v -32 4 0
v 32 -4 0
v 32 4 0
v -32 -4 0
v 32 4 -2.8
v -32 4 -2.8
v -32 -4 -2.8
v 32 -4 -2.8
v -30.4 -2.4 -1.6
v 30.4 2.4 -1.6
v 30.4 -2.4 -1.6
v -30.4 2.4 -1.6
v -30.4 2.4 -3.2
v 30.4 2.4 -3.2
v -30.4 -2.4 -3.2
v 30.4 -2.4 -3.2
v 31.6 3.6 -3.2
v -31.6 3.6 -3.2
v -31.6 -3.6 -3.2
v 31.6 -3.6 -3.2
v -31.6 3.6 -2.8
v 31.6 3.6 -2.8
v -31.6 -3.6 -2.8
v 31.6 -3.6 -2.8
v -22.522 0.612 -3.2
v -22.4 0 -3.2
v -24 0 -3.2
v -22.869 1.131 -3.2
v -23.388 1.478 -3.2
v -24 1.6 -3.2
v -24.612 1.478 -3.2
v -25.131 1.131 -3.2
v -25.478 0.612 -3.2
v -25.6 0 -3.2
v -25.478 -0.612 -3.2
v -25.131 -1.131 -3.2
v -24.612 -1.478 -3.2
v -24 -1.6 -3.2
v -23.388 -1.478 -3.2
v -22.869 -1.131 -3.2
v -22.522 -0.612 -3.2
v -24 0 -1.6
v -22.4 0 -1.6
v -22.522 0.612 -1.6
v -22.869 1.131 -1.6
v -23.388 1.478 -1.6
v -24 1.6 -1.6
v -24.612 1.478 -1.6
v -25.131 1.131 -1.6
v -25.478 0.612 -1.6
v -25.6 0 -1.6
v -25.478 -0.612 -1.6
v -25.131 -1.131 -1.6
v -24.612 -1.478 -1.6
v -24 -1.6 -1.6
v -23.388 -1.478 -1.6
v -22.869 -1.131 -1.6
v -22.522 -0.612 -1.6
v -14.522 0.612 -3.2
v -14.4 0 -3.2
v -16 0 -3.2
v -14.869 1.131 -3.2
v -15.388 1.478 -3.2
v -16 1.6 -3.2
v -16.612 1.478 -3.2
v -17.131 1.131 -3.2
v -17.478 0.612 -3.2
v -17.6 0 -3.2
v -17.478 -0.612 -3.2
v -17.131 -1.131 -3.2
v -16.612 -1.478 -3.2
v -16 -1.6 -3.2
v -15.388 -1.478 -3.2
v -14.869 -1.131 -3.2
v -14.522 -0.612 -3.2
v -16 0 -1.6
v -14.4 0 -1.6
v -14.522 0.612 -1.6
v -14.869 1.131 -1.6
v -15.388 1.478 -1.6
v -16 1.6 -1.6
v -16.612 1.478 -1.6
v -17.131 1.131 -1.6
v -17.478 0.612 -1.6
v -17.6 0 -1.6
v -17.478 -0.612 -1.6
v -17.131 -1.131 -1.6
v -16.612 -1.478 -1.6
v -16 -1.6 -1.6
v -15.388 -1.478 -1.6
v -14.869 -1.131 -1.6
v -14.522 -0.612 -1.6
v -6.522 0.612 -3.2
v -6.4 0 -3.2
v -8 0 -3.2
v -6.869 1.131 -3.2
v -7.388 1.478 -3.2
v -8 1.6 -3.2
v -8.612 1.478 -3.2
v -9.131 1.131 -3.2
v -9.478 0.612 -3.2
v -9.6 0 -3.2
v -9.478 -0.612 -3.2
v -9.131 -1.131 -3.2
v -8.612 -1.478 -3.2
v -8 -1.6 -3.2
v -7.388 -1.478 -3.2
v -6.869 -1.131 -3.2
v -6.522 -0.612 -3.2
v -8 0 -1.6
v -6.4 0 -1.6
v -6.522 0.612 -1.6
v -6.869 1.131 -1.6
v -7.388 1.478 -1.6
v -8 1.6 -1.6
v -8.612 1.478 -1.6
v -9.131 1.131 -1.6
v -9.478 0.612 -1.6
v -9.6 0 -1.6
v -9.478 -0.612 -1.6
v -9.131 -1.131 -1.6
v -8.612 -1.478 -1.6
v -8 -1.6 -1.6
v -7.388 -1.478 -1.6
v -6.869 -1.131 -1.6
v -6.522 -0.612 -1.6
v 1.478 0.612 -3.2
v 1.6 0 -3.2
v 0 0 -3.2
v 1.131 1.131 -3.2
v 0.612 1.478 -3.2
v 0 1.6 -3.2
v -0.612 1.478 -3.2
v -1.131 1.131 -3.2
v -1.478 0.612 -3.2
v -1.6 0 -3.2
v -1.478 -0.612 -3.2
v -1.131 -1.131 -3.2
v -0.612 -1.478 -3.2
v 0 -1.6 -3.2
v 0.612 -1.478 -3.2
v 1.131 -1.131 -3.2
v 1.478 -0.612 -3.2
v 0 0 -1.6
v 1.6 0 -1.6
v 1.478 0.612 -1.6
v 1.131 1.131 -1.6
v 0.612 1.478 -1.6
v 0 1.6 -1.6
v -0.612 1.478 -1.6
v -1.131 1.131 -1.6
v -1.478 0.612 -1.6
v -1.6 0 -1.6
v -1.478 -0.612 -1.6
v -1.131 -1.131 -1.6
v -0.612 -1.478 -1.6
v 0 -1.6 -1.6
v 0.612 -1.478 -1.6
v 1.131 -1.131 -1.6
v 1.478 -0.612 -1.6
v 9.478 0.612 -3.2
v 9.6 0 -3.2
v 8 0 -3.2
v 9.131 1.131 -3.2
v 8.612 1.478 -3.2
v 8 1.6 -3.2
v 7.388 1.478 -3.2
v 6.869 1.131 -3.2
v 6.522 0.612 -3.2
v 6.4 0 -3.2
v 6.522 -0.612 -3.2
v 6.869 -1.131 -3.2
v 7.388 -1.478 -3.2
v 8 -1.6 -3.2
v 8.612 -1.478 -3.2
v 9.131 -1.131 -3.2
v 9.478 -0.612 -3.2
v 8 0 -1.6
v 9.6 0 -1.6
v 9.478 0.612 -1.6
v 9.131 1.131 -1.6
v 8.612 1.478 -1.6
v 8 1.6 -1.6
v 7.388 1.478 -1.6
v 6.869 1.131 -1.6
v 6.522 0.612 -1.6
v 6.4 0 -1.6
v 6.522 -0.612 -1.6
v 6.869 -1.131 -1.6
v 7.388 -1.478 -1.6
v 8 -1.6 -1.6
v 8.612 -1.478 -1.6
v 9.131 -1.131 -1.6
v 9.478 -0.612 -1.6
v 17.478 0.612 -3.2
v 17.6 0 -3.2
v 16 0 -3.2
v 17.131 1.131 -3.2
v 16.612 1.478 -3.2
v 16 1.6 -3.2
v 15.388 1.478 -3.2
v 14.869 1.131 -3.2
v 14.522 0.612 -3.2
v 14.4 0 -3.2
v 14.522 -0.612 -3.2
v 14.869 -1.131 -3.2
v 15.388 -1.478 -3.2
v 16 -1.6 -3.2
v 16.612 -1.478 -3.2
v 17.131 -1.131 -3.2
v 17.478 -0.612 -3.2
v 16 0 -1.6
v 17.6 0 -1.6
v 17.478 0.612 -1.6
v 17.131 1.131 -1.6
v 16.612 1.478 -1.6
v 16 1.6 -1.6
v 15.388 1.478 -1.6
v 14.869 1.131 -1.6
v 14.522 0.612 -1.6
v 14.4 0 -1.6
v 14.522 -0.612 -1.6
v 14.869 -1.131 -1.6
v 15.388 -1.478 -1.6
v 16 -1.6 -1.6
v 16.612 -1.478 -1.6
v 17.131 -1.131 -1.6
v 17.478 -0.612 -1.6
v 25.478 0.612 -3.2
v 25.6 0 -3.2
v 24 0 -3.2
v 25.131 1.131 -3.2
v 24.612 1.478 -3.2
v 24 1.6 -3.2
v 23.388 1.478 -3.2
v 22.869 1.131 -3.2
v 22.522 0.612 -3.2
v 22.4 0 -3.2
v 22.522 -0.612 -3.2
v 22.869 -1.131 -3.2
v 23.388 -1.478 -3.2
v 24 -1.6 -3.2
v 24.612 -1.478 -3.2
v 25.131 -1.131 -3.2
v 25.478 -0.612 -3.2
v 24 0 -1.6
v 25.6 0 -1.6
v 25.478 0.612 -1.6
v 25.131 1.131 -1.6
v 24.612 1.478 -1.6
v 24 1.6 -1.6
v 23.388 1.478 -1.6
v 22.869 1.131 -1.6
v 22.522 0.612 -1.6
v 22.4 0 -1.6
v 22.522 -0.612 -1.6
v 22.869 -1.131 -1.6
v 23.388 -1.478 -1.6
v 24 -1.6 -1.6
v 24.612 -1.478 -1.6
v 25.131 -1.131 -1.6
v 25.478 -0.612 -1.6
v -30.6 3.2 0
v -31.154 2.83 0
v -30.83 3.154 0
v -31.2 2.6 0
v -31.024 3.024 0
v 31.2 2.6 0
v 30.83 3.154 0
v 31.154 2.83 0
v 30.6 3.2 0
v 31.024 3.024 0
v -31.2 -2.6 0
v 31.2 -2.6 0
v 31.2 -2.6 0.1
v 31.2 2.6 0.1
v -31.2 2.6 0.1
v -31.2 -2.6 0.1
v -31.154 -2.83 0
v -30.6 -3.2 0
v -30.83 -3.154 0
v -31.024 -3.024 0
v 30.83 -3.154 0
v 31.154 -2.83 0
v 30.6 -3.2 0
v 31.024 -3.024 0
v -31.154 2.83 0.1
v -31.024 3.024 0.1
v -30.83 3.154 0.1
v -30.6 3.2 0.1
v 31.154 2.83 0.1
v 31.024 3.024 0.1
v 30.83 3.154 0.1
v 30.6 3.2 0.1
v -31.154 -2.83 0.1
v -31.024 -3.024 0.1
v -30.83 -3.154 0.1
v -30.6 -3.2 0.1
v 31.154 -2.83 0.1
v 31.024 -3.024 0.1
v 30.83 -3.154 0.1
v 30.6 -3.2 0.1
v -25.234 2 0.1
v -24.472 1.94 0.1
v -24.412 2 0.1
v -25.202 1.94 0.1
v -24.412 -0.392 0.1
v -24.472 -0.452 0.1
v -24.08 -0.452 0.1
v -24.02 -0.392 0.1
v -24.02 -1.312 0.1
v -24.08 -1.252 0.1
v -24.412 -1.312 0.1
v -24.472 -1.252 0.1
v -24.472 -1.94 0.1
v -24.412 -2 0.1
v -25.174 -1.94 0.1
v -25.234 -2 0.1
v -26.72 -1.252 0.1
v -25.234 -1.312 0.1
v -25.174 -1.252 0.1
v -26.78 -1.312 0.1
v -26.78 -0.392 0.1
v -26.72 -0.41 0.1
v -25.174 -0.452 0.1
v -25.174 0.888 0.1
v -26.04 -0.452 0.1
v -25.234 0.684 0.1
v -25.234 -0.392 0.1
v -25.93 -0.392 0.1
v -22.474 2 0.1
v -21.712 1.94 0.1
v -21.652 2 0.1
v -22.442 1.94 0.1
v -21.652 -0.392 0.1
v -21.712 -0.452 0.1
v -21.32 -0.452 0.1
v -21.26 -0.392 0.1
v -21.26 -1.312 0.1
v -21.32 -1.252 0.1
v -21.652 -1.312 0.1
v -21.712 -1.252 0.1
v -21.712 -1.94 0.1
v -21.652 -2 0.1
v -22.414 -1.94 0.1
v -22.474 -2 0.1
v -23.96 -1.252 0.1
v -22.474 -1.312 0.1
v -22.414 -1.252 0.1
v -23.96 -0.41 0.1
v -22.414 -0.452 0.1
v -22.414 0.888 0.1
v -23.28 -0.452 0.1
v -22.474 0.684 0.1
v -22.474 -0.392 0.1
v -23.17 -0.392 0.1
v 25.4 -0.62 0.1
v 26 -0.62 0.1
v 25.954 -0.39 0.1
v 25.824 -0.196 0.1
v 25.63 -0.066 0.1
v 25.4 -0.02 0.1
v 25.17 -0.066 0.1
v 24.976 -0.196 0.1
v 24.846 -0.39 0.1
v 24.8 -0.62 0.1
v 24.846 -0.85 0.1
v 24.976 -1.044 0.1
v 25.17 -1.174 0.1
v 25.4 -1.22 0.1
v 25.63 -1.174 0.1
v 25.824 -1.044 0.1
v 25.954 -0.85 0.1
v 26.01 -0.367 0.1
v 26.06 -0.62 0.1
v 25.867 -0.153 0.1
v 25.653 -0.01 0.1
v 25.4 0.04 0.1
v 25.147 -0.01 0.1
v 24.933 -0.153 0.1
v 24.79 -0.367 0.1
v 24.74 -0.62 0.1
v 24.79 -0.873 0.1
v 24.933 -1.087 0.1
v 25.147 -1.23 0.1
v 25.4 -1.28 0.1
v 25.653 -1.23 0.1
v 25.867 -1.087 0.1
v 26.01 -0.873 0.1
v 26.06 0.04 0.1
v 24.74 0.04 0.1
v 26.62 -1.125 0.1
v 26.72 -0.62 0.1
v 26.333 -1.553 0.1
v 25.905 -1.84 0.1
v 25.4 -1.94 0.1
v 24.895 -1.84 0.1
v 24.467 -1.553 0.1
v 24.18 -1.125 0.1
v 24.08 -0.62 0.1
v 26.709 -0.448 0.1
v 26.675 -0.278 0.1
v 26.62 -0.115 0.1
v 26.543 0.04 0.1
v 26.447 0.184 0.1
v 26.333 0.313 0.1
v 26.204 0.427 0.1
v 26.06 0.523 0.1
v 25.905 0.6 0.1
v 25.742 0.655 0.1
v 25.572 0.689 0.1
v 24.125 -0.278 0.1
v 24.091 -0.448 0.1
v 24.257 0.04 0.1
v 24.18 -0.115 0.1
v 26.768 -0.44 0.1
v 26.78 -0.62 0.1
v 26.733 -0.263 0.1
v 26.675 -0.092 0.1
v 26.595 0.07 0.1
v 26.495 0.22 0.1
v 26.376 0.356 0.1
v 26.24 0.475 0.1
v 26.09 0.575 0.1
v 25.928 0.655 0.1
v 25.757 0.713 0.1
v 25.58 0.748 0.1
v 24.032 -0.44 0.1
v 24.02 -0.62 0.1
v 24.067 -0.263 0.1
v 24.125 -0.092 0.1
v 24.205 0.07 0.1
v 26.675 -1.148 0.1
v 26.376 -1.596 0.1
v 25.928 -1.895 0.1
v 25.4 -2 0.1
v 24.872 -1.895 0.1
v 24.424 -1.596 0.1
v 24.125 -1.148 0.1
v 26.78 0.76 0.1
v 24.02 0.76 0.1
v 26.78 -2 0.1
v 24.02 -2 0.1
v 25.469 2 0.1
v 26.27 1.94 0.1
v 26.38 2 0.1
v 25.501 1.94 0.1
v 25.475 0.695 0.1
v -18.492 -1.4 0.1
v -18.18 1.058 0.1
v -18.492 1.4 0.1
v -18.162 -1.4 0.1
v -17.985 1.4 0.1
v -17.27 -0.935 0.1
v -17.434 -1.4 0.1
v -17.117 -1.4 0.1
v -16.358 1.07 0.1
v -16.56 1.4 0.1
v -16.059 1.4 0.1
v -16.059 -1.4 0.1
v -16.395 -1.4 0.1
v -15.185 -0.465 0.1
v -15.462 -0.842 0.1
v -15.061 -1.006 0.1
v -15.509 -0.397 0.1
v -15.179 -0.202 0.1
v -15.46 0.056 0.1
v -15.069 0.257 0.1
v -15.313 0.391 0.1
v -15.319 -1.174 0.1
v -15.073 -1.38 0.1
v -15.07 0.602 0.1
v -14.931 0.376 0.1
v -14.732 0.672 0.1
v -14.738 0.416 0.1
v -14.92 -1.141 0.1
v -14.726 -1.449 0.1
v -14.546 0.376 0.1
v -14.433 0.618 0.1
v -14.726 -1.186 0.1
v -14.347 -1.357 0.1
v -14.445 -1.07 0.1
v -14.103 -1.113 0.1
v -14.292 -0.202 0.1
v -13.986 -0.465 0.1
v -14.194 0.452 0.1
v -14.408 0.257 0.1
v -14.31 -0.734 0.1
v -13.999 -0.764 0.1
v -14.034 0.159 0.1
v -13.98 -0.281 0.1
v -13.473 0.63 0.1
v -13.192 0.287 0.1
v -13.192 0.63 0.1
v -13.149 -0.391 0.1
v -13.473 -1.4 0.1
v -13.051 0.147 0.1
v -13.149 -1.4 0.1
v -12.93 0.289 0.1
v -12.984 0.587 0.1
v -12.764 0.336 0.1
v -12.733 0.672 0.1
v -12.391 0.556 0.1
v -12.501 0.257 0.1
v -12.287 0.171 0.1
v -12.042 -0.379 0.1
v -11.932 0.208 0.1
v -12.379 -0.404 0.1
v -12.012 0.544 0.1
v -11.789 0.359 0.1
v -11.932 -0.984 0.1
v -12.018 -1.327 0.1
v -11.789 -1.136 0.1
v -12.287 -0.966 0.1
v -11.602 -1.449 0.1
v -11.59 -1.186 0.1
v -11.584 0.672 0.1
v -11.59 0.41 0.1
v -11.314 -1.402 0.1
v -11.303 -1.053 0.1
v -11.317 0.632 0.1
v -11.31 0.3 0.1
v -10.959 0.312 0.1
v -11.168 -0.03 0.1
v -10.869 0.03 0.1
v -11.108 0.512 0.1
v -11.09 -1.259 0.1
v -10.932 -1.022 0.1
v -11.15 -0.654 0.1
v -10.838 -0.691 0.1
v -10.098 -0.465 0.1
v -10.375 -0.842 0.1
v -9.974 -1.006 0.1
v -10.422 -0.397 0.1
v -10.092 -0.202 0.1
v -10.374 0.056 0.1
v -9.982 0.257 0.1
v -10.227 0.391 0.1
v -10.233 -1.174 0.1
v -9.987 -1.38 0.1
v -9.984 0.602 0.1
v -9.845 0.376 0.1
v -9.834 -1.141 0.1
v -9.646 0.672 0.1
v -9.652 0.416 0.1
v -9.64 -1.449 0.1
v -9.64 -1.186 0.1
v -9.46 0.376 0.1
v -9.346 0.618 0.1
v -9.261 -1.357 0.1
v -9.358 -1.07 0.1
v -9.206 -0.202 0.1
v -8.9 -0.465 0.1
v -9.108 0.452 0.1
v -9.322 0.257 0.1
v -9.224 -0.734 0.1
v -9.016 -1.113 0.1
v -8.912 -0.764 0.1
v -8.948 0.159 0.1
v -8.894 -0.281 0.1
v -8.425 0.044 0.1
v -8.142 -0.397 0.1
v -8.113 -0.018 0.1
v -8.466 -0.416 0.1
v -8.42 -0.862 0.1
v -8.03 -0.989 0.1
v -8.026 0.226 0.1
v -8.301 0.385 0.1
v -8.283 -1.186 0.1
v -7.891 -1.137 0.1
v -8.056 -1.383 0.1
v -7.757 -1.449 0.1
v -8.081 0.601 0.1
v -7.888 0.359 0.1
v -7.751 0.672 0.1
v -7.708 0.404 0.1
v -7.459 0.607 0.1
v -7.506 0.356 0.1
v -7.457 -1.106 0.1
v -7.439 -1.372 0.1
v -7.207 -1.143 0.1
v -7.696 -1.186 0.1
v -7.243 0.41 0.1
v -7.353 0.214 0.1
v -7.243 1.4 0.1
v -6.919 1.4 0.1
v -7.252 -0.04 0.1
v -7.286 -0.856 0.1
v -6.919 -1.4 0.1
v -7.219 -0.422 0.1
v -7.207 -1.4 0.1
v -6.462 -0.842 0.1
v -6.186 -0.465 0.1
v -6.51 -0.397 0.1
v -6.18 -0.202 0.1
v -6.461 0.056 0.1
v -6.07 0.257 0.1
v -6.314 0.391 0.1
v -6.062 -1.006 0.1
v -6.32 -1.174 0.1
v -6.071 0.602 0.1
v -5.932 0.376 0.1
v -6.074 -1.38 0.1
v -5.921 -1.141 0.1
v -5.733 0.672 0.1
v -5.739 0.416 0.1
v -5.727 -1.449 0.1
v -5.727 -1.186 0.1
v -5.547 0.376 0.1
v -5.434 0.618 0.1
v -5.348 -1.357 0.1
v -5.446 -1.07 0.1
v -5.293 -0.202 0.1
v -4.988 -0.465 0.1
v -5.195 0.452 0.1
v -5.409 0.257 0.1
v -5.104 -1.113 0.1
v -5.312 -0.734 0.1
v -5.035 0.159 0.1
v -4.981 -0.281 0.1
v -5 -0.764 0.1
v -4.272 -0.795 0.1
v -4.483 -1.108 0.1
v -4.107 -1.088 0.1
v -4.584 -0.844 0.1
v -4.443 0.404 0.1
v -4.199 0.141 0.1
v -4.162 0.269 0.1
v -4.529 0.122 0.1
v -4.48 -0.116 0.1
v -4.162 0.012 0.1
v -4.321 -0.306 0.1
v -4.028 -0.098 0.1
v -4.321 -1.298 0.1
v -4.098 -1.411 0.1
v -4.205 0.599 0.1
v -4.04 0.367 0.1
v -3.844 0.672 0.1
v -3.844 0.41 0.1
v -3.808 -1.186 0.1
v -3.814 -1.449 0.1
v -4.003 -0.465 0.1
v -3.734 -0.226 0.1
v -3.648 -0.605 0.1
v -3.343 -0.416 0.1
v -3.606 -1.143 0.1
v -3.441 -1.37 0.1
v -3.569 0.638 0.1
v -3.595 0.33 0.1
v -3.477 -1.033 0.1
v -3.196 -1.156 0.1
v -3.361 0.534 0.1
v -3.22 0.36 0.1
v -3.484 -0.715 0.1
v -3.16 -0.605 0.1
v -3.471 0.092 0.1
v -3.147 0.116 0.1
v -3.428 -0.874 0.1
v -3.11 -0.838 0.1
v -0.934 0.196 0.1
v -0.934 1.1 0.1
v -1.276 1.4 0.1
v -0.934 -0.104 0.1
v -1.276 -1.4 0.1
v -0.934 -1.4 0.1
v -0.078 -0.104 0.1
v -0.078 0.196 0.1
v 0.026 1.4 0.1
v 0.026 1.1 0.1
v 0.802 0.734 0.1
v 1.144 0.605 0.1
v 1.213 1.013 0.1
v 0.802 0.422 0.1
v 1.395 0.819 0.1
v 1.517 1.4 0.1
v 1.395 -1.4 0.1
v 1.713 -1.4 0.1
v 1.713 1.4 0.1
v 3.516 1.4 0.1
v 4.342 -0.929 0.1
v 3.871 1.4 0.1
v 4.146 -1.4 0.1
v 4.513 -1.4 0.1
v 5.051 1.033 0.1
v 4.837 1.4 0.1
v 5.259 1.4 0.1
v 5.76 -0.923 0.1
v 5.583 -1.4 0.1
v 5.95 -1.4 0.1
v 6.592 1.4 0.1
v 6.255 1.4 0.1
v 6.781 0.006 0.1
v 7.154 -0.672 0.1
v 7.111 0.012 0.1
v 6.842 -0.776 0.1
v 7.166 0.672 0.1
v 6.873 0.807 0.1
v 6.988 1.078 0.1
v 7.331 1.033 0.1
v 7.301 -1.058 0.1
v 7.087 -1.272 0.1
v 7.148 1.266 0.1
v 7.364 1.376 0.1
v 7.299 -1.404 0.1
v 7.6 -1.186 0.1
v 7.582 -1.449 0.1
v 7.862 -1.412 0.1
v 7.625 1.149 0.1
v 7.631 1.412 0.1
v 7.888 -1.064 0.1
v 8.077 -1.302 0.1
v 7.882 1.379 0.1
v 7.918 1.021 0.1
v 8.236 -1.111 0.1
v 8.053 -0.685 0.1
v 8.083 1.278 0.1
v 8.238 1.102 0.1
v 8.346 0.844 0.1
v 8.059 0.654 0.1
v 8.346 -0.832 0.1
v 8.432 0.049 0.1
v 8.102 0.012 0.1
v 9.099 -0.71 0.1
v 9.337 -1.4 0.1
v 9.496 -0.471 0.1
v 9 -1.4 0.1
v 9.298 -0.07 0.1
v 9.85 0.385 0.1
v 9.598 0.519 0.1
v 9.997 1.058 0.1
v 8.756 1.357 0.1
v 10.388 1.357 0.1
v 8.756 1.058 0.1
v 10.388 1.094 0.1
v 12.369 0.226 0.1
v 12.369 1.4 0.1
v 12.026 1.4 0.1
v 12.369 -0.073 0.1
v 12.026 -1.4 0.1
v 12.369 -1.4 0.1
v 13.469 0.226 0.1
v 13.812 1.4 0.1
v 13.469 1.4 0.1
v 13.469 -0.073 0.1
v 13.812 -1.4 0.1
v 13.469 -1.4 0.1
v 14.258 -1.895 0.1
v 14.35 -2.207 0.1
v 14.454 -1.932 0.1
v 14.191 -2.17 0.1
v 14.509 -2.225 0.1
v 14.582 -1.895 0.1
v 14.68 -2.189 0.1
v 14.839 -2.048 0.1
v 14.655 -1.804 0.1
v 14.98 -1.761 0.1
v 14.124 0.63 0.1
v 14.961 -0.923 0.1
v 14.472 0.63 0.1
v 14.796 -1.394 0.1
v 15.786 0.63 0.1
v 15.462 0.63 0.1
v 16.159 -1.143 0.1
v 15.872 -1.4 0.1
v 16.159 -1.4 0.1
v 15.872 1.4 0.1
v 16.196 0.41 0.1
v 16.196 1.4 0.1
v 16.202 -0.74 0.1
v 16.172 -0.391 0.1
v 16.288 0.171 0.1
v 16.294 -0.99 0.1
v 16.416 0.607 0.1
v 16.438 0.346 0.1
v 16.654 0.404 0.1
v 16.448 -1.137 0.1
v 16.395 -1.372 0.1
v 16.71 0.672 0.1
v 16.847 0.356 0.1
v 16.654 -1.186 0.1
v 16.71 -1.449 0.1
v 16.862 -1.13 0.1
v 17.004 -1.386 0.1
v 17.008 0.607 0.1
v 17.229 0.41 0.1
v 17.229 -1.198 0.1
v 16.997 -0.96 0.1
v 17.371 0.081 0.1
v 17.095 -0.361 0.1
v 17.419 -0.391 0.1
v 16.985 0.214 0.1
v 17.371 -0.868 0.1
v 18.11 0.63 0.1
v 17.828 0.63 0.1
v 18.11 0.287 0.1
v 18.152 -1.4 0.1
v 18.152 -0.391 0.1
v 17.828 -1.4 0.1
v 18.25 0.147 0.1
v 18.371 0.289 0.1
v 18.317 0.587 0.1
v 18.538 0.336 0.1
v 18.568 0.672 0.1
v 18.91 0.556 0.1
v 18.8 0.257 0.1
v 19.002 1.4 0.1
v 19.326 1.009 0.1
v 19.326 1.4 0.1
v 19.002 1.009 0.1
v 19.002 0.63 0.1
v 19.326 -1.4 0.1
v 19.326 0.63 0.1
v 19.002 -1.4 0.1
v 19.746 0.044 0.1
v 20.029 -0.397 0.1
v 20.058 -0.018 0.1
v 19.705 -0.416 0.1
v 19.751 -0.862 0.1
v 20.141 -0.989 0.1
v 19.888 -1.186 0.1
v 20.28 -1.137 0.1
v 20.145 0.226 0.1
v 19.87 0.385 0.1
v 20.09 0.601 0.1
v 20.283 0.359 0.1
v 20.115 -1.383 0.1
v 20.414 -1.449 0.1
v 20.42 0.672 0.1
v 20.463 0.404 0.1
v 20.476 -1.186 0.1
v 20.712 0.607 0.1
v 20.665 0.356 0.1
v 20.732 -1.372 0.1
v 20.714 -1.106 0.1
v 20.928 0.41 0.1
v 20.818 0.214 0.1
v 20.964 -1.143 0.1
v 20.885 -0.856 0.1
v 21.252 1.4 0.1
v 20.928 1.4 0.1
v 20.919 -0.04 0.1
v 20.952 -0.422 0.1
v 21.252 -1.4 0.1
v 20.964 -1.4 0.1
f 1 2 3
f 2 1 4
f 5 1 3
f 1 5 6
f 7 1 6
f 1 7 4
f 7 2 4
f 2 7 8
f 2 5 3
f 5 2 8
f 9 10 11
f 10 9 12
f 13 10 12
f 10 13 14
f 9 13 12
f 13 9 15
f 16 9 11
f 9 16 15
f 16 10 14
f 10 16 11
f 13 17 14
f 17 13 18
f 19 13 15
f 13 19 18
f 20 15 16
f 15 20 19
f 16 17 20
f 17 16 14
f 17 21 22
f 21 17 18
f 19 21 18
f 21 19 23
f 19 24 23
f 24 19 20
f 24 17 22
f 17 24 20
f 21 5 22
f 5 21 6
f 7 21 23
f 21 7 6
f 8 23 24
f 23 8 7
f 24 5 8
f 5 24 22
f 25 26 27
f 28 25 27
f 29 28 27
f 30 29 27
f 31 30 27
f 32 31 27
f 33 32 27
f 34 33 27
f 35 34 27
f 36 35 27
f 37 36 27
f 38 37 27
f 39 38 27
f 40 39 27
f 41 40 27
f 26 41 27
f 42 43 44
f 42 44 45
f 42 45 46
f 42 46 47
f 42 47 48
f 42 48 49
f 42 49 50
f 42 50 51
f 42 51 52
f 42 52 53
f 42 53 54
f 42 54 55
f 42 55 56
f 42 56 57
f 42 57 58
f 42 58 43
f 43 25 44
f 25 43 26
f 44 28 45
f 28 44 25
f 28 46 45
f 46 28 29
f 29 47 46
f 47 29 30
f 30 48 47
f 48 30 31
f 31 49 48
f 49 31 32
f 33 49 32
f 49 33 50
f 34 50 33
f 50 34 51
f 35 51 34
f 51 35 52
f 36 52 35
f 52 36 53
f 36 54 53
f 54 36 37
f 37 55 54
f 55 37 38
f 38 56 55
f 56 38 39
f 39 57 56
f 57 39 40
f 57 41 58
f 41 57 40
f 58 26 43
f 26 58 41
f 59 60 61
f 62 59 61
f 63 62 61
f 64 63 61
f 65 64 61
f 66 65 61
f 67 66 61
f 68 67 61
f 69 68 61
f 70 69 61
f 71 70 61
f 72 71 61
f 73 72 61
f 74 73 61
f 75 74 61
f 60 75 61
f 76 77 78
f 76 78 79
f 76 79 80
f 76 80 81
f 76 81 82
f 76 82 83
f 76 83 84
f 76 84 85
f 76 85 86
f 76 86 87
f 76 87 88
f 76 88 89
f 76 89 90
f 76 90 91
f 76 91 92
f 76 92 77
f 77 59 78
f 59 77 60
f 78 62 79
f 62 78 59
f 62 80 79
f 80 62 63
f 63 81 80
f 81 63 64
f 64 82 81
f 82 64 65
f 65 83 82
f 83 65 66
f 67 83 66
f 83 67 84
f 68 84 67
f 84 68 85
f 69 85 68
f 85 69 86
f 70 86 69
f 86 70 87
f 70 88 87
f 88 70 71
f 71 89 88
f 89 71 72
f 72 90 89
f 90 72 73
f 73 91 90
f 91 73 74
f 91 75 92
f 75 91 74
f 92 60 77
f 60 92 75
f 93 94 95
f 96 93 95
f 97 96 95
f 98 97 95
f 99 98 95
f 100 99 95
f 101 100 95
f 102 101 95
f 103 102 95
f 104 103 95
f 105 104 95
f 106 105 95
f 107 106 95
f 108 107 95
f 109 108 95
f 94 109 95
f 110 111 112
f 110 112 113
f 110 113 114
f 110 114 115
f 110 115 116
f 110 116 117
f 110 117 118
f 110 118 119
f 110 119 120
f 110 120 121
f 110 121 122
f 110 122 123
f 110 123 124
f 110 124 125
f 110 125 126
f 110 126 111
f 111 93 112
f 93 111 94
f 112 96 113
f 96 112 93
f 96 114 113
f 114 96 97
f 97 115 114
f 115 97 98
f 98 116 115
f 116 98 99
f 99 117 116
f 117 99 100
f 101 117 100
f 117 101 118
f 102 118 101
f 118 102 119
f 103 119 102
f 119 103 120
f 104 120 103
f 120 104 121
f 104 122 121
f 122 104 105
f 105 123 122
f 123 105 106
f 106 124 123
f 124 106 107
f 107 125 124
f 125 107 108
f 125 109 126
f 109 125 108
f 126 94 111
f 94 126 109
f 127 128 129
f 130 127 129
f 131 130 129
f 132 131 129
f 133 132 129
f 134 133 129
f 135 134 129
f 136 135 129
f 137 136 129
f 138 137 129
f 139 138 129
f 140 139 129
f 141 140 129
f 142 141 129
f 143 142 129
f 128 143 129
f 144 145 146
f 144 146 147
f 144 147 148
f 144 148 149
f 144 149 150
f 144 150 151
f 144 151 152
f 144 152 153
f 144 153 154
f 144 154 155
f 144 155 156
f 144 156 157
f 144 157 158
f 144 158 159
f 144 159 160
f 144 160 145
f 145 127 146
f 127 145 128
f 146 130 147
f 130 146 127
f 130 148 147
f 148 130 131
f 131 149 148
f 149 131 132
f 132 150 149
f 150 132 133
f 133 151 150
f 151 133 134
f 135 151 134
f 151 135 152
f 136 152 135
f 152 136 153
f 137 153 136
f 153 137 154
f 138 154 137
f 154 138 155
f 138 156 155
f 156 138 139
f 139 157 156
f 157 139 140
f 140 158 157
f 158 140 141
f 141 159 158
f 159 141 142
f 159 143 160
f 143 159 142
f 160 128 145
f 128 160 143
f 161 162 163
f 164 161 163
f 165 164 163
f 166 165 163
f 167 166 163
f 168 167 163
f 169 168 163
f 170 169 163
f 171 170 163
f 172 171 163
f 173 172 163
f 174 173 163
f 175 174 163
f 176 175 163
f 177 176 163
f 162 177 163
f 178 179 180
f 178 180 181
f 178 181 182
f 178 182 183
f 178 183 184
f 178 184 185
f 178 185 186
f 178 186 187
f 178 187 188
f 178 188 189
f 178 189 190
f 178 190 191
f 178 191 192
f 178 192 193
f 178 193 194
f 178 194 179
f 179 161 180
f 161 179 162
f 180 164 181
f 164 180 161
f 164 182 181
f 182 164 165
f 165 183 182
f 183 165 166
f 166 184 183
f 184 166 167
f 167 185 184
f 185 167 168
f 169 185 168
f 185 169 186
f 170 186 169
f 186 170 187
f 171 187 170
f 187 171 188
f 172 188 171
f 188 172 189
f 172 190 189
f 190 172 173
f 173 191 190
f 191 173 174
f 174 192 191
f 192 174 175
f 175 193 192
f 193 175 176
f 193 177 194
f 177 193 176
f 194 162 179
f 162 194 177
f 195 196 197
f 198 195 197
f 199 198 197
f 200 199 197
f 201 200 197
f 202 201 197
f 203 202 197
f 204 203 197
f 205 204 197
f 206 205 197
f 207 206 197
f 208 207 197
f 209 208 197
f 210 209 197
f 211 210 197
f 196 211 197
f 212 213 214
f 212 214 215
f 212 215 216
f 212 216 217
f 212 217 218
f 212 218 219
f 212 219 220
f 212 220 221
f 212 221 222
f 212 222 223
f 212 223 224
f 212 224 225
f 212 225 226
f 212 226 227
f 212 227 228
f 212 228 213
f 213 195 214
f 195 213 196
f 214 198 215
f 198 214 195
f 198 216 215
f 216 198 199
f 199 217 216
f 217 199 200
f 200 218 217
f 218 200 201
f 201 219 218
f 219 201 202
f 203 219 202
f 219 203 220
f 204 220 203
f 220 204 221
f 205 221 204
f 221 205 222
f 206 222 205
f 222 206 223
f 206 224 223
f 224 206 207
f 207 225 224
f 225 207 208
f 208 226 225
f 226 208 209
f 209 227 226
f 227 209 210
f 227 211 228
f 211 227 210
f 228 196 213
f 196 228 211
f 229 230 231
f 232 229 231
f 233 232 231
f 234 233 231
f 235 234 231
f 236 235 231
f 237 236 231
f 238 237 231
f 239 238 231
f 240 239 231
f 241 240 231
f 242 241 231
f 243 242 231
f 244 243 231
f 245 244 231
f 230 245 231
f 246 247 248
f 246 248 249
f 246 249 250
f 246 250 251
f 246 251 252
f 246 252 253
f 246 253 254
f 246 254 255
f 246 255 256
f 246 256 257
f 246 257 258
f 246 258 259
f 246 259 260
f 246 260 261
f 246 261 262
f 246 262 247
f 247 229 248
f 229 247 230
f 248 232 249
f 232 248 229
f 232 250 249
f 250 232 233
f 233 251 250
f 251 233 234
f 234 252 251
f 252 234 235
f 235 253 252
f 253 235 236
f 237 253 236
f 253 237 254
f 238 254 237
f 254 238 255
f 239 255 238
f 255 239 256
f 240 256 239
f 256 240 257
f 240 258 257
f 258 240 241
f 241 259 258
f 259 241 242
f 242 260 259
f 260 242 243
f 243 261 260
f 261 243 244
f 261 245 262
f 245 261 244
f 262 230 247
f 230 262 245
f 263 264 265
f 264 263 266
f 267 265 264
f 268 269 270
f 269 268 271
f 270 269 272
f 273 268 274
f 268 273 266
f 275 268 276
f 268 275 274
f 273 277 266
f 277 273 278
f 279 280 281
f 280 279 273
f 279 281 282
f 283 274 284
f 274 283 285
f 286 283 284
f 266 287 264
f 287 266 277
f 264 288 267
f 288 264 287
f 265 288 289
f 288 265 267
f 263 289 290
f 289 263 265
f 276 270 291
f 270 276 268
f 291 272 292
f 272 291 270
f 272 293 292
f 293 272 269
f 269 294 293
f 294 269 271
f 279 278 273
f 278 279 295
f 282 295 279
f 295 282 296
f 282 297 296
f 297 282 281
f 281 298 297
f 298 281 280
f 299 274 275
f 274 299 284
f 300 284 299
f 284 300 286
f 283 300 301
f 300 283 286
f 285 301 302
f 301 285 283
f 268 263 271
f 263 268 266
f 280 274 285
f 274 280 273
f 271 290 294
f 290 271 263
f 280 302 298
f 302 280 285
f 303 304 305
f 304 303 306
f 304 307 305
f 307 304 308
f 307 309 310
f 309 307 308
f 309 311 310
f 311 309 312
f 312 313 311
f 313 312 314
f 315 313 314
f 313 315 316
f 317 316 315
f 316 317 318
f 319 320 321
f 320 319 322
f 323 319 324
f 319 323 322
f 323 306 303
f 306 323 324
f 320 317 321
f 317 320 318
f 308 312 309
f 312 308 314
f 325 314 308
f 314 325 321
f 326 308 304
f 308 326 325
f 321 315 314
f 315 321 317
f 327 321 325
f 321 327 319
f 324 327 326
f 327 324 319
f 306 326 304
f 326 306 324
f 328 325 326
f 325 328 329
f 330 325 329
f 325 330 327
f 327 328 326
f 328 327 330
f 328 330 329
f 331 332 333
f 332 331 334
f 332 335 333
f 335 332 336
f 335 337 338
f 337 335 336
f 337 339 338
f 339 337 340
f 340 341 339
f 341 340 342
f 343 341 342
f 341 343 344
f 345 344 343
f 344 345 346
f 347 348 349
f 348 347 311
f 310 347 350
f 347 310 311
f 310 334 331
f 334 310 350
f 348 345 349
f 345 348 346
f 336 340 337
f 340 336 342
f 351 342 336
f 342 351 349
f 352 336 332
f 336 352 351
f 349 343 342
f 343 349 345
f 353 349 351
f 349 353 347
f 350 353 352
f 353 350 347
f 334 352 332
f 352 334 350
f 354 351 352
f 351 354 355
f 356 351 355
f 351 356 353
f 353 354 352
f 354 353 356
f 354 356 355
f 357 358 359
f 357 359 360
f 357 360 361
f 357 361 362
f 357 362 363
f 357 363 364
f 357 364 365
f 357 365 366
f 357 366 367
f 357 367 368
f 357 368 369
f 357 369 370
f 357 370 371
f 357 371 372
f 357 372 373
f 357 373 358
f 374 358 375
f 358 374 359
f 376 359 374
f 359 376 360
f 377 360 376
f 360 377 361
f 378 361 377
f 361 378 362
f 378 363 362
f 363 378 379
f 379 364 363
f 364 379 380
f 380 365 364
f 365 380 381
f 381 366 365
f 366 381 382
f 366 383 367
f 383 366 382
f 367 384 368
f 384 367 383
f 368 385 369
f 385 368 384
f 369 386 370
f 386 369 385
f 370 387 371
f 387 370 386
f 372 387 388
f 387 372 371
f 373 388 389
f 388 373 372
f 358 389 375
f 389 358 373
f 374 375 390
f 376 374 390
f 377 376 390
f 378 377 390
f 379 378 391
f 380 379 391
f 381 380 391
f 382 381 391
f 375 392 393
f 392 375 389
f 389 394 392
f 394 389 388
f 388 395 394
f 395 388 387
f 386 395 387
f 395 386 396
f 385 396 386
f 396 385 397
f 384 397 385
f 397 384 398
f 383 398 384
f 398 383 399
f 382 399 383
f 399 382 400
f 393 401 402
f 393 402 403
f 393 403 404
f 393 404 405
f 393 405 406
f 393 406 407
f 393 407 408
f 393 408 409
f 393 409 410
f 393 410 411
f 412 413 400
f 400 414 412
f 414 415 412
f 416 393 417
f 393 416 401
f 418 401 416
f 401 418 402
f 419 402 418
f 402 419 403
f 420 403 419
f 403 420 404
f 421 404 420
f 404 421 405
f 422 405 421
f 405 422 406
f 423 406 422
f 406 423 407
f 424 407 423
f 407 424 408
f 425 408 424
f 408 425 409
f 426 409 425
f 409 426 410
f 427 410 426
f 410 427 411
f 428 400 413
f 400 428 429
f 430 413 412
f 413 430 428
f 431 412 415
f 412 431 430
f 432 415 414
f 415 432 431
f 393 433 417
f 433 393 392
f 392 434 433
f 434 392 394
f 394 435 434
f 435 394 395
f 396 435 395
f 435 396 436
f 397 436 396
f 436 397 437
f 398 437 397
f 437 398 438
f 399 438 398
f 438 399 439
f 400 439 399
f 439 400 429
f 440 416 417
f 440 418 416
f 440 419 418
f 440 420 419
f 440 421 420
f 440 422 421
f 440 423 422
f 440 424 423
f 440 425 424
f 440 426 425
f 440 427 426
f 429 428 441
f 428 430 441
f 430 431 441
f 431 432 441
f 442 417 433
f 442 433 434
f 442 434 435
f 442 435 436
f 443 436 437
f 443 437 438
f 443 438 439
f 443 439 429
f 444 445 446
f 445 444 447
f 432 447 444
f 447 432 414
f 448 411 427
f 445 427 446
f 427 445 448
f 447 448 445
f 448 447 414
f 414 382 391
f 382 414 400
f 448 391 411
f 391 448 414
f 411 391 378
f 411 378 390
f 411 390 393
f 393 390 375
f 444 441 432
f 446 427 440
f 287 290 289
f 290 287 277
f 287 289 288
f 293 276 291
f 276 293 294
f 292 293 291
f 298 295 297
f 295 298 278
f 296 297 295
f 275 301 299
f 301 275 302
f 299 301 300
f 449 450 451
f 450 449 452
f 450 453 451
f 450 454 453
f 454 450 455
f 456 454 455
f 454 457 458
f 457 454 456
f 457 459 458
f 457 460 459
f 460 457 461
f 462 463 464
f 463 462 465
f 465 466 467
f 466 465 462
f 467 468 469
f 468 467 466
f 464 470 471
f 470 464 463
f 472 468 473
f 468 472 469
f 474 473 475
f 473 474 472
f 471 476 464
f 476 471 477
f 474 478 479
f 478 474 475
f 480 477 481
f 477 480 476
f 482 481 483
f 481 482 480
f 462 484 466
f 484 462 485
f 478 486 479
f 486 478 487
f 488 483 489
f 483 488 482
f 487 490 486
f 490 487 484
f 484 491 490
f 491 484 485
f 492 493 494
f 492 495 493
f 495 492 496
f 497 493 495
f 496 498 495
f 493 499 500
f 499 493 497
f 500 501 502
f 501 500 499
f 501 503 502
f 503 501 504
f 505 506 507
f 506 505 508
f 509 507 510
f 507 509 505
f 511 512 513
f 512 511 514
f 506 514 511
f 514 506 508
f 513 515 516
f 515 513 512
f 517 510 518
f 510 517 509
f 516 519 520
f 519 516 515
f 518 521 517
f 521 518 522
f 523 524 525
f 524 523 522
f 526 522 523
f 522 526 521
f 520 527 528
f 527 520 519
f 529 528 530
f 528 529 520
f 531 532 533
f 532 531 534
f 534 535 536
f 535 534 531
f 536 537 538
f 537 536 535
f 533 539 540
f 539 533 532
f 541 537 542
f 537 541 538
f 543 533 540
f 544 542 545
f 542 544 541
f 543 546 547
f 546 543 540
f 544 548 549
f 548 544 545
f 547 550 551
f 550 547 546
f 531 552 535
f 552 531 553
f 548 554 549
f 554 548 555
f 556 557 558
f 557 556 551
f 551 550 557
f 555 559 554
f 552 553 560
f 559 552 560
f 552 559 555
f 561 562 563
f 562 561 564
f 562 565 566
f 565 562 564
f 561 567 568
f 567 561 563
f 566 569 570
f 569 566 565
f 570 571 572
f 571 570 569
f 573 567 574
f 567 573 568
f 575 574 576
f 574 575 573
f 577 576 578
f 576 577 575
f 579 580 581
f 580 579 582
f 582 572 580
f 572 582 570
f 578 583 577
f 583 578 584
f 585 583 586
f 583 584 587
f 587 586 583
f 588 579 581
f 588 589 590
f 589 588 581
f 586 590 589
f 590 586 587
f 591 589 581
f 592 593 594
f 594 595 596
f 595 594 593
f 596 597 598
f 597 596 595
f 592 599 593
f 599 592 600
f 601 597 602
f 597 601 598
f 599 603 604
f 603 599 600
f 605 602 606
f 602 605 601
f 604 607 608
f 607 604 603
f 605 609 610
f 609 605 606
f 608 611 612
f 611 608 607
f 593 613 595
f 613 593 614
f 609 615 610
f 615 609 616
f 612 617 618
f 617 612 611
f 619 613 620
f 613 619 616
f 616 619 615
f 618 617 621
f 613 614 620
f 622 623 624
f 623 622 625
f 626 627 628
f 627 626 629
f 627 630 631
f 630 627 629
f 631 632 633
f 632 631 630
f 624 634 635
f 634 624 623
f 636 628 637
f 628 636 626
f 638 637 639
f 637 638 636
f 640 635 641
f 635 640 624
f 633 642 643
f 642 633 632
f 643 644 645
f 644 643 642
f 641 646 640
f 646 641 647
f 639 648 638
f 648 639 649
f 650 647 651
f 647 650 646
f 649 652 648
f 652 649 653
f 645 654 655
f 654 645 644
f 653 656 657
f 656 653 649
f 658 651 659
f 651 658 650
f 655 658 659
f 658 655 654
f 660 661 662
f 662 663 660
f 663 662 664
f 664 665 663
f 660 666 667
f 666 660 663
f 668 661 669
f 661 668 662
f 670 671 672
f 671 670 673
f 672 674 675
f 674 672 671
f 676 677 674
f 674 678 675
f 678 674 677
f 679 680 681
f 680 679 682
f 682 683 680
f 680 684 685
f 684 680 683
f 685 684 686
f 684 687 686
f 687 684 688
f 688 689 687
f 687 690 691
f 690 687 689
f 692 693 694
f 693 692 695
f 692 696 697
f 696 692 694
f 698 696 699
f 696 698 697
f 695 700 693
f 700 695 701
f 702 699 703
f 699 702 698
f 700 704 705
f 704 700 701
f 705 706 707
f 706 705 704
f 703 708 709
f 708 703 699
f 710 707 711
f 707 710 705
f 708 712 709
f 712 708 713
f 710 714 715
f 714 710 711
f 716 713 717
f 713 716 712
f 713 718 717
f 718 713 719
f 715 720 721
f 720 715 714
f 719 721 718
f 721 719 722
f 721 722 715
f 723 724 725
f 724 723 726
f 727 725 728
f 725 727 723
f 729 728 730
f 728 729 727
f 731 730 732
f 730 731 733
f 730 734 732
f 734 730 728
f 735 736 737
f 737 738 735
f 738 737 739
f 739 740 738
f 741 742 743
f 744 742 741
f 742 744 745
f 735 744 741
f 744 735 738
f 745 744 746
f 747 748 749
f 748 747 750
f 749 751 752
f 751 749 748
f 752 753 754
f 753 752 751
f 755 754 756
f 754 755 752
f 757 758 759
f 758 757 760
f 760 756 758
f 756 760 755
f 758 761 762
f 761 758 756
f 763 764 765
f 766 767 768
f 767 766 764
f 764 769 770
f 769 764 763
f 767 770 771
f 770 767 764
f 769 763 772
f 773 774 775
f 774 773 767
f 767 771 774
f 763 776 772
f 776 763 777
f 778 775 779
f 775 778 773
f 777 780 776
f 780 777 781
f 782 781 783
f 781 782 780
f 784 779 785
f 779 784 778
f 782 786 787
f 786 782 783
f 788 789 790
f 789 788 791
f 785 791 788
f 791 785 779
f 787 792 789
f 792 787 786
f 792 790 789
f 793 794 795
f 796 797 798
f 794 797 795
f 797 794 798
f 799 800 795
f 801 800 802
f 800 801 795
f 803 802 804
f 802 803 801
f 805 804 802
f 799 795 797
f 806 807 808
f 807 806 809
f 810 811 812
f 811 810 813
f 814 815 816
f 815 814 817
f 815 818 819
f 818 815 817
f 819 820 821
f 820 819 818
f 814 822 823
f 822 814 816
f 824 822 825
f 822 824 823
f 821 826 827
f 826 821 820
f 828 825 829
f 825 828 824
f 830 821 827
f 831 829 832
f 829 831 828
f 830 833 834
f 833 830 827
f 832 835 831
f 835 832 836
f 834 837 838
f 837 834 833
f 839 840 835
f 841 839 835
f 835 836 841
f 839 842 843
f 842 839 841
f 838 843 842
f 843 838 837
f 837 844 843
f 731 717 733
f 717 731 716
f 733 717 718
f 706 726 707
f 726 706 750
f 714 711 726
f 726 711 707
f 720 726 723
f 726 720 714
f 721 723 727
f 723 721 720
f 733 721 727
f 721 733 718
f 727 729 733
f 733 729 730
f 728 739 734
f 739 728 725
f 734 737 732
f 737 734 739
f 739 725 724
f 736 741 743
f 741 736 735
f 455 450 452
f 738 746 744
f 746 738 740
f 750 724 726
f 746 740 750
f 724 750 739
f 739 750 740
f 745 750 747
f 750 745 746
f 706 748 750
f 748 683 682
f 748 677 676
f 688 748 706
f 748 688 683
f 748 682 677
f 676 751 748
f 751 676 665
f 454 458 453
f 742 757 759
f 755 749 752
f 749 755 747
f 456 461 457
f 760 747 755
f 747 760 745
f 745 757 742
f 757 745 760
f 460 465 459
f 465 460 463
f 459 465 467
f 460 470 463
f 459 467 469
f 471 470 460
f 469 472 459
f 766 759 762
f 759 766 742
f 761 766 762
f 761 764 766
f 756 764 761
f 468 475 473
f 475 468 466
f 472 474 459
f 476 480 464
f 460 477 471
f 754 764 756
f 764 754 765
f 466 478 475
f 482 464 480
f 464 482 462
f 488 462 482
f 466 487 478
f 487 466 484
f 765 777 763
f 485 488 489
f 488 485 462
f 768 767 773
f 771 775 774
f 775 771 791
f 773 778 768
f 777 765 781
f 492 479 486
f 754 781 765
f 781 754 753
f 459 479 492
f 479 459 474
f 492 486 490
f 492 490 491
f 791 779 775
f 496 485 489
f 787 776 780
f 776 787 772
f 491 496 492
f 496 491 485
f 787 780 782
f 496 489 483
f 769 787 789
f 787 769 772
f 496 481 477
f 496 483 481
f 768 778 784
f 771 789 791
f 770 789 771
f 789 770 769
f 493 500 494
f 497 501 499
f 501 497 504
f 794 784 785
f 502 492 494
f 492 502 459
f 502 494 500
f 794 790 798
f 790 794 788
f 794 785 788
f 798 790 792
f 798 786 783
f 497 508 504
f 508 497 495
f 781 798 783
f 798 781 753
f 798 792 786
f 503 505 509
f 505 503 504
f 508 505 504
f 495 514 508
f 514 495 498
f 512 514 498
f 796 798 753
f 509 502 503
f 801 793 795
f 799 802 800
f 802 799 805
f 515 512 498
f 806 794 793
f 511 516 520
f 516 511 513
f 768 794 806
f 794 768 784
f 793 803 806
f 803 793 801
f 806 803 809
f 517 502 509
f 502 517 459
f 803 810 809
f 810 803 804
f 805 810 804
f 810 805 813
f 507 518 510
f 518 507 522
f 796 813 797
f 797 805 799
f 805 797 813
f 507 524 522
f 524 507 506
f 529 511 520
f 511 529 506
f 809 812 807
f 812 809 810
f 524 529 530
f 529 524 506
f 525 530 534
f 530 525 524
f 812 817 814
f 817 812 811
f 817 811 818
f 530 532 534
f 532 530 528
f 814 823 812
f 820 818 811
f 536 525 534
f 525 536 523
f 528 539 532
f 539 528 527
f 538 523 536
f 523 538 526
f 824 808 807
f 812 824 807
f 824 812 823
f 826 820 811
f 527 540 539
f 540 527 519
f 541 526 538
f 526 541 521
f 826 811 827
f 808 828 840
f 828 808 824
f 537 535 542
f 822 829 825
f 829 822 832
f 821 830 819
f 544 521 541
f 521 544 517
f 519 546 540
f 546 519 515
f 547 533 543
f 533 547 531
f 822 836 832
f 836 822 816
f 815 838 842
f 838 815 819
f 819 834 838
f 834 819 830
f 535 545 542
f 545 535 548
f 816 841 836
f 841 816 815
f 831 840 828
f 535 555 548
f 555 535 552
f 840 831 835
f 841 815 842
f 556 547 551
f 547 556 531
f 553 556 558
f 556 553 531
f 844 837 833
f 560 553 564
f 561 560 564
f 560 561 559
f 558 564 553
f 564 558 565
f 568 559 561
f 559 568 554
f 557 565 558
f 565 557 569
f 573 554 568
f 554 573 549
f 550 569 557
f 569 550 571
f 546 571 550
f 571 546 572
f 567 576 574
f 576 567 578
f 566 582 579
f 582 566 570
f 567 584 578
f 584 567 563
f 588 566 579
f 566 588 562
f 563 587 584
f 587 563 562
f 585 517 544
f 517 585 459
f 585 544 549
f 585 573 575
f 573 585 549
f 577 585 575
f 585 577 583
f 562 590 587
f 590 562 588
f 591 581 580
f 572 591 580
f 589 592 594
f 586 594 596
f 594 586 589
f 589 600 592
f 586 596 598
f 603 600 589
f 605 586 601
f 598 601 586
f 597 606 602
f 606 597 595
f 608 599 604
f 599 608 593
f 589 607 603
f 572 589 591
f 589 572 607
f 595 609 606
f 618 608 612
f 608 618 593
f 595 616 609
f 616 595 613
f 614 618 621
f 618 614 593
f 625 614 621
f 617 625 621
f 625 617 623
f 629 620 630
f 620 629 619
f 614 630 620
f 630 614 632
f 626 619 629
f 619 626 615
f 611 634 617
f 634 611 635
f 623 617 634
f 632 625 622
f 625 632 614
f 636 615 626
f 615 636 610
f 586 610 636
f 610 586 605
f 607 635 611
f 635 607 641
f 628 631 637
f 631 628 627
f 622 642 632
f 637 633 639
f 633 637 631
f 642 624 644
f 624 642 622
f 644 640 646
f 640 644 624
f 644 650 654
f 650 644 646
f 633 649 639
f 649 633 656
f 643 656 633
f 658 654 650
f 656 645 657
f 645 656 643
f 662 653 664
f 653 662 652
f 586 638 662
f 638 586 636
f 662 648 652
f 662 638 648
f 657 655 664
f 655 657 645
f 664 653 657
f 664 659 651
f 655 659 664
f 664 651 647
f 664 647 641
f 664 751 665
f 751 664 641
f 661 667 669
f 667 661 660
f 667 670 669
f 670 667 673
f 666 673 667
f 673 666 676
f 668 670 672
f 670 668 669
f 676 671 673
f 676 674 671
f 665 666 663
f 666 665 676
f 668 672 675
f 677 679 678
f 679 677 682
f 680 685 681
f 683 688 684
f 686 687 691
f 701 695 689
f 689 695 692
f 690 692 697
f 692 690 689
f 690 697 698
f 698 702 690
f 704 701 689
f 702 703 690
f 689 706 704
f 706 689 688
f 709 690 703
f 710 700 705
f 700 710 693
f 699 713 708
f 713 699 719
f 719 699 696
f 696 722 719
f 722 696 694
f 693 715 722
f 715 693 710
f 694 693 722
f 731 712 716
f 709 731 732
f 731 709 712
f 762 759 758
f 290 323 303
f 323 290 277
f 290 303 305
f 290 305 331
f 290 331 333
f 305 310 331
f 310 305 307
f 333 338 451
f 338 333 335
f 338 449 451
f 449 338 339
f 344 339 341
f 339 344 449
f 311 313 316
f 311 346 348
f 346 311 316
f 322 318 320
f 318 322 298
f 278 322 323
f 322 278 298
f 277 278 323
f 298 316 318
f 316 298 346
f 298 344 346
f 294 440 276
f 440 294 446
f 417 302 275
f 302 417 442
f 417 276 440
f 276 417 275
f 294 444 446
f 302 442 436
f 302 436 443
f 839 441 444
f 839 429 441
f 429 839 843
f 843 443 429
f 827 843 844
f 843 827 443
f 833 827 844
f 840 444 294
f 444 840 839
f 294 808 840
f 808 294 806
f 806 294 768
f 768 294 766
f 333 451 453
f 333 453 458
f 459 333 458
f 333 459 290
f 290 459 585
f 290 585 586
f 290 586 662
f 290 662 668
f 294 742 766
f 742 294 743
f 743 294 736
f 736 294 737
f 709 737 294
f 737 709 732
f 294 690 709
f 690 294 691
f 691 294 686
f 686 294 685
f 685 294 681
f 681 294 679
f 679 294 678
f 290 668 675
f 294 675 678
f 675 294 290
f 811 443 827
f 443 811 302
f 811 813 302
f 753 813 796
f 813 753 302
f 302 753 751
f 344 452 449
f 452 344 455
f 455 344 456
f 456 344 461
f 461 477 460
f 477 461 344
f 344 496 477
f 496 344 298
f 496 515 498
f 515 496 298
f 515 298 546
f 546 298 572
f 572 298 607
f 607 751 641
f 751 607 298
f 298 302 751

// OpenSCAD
use <../lib.scad>
use <4162.scad>
use <6177973s.scad>
function ldraw_lib__4162d0l() = [
// 0 Tile  1 x  8 with Black "44 Mercedes F1 W07 Hybrid 6" on Silver Background Sticker
// 0 Name: 4162d0l.dat
// 0 Author: Vincent Messenet [Cheenzo]
// 0 !LDRAW_ORG Shortcut UPDATE 2026-09
// 0 !LICENSE Licensed under CC BY 4.0 : see CAreadme.txt
// 
// 0 BFC CERTIFY CCW
  [0,"BFC","CERTIFY"],
  [0,"BFC","CCW"],
// 
// 0 !CATEGORY Sticker Shortcut
// 0 !KEYWORDS BrickLink 75883stk01, Set 75883
// 
// 0 !HISTORY 2026-09-30 [OrionP] Official Update 2026-09
// 
// 1 16 0 0 0 1 0 0 0 1 0 0 0 1 4162.dat
  [1,16,0,0,0,1,0,0,0,1,0,0,0,1, ldraw_lib__4162()],
// 1 16 0 0 0 1 0 0 0 1 0 0 0 1 6177973s.dat
  [1,16,0,0,0,1,0,0,0,1,0,0,0,1, ldraw_lib__6177973s()],
];
module ldraw_lib__4162d0l(step=0, col=false, unit=2/5, alt=false, line=0.2, solid=!$preview)
    makepoly(ldraw_lib__4162d0l(), step=step, col=col, unit=unit, alt=alt, line=line, solid=solid);
ldraw_lib__4162d0l(line=0.2);
